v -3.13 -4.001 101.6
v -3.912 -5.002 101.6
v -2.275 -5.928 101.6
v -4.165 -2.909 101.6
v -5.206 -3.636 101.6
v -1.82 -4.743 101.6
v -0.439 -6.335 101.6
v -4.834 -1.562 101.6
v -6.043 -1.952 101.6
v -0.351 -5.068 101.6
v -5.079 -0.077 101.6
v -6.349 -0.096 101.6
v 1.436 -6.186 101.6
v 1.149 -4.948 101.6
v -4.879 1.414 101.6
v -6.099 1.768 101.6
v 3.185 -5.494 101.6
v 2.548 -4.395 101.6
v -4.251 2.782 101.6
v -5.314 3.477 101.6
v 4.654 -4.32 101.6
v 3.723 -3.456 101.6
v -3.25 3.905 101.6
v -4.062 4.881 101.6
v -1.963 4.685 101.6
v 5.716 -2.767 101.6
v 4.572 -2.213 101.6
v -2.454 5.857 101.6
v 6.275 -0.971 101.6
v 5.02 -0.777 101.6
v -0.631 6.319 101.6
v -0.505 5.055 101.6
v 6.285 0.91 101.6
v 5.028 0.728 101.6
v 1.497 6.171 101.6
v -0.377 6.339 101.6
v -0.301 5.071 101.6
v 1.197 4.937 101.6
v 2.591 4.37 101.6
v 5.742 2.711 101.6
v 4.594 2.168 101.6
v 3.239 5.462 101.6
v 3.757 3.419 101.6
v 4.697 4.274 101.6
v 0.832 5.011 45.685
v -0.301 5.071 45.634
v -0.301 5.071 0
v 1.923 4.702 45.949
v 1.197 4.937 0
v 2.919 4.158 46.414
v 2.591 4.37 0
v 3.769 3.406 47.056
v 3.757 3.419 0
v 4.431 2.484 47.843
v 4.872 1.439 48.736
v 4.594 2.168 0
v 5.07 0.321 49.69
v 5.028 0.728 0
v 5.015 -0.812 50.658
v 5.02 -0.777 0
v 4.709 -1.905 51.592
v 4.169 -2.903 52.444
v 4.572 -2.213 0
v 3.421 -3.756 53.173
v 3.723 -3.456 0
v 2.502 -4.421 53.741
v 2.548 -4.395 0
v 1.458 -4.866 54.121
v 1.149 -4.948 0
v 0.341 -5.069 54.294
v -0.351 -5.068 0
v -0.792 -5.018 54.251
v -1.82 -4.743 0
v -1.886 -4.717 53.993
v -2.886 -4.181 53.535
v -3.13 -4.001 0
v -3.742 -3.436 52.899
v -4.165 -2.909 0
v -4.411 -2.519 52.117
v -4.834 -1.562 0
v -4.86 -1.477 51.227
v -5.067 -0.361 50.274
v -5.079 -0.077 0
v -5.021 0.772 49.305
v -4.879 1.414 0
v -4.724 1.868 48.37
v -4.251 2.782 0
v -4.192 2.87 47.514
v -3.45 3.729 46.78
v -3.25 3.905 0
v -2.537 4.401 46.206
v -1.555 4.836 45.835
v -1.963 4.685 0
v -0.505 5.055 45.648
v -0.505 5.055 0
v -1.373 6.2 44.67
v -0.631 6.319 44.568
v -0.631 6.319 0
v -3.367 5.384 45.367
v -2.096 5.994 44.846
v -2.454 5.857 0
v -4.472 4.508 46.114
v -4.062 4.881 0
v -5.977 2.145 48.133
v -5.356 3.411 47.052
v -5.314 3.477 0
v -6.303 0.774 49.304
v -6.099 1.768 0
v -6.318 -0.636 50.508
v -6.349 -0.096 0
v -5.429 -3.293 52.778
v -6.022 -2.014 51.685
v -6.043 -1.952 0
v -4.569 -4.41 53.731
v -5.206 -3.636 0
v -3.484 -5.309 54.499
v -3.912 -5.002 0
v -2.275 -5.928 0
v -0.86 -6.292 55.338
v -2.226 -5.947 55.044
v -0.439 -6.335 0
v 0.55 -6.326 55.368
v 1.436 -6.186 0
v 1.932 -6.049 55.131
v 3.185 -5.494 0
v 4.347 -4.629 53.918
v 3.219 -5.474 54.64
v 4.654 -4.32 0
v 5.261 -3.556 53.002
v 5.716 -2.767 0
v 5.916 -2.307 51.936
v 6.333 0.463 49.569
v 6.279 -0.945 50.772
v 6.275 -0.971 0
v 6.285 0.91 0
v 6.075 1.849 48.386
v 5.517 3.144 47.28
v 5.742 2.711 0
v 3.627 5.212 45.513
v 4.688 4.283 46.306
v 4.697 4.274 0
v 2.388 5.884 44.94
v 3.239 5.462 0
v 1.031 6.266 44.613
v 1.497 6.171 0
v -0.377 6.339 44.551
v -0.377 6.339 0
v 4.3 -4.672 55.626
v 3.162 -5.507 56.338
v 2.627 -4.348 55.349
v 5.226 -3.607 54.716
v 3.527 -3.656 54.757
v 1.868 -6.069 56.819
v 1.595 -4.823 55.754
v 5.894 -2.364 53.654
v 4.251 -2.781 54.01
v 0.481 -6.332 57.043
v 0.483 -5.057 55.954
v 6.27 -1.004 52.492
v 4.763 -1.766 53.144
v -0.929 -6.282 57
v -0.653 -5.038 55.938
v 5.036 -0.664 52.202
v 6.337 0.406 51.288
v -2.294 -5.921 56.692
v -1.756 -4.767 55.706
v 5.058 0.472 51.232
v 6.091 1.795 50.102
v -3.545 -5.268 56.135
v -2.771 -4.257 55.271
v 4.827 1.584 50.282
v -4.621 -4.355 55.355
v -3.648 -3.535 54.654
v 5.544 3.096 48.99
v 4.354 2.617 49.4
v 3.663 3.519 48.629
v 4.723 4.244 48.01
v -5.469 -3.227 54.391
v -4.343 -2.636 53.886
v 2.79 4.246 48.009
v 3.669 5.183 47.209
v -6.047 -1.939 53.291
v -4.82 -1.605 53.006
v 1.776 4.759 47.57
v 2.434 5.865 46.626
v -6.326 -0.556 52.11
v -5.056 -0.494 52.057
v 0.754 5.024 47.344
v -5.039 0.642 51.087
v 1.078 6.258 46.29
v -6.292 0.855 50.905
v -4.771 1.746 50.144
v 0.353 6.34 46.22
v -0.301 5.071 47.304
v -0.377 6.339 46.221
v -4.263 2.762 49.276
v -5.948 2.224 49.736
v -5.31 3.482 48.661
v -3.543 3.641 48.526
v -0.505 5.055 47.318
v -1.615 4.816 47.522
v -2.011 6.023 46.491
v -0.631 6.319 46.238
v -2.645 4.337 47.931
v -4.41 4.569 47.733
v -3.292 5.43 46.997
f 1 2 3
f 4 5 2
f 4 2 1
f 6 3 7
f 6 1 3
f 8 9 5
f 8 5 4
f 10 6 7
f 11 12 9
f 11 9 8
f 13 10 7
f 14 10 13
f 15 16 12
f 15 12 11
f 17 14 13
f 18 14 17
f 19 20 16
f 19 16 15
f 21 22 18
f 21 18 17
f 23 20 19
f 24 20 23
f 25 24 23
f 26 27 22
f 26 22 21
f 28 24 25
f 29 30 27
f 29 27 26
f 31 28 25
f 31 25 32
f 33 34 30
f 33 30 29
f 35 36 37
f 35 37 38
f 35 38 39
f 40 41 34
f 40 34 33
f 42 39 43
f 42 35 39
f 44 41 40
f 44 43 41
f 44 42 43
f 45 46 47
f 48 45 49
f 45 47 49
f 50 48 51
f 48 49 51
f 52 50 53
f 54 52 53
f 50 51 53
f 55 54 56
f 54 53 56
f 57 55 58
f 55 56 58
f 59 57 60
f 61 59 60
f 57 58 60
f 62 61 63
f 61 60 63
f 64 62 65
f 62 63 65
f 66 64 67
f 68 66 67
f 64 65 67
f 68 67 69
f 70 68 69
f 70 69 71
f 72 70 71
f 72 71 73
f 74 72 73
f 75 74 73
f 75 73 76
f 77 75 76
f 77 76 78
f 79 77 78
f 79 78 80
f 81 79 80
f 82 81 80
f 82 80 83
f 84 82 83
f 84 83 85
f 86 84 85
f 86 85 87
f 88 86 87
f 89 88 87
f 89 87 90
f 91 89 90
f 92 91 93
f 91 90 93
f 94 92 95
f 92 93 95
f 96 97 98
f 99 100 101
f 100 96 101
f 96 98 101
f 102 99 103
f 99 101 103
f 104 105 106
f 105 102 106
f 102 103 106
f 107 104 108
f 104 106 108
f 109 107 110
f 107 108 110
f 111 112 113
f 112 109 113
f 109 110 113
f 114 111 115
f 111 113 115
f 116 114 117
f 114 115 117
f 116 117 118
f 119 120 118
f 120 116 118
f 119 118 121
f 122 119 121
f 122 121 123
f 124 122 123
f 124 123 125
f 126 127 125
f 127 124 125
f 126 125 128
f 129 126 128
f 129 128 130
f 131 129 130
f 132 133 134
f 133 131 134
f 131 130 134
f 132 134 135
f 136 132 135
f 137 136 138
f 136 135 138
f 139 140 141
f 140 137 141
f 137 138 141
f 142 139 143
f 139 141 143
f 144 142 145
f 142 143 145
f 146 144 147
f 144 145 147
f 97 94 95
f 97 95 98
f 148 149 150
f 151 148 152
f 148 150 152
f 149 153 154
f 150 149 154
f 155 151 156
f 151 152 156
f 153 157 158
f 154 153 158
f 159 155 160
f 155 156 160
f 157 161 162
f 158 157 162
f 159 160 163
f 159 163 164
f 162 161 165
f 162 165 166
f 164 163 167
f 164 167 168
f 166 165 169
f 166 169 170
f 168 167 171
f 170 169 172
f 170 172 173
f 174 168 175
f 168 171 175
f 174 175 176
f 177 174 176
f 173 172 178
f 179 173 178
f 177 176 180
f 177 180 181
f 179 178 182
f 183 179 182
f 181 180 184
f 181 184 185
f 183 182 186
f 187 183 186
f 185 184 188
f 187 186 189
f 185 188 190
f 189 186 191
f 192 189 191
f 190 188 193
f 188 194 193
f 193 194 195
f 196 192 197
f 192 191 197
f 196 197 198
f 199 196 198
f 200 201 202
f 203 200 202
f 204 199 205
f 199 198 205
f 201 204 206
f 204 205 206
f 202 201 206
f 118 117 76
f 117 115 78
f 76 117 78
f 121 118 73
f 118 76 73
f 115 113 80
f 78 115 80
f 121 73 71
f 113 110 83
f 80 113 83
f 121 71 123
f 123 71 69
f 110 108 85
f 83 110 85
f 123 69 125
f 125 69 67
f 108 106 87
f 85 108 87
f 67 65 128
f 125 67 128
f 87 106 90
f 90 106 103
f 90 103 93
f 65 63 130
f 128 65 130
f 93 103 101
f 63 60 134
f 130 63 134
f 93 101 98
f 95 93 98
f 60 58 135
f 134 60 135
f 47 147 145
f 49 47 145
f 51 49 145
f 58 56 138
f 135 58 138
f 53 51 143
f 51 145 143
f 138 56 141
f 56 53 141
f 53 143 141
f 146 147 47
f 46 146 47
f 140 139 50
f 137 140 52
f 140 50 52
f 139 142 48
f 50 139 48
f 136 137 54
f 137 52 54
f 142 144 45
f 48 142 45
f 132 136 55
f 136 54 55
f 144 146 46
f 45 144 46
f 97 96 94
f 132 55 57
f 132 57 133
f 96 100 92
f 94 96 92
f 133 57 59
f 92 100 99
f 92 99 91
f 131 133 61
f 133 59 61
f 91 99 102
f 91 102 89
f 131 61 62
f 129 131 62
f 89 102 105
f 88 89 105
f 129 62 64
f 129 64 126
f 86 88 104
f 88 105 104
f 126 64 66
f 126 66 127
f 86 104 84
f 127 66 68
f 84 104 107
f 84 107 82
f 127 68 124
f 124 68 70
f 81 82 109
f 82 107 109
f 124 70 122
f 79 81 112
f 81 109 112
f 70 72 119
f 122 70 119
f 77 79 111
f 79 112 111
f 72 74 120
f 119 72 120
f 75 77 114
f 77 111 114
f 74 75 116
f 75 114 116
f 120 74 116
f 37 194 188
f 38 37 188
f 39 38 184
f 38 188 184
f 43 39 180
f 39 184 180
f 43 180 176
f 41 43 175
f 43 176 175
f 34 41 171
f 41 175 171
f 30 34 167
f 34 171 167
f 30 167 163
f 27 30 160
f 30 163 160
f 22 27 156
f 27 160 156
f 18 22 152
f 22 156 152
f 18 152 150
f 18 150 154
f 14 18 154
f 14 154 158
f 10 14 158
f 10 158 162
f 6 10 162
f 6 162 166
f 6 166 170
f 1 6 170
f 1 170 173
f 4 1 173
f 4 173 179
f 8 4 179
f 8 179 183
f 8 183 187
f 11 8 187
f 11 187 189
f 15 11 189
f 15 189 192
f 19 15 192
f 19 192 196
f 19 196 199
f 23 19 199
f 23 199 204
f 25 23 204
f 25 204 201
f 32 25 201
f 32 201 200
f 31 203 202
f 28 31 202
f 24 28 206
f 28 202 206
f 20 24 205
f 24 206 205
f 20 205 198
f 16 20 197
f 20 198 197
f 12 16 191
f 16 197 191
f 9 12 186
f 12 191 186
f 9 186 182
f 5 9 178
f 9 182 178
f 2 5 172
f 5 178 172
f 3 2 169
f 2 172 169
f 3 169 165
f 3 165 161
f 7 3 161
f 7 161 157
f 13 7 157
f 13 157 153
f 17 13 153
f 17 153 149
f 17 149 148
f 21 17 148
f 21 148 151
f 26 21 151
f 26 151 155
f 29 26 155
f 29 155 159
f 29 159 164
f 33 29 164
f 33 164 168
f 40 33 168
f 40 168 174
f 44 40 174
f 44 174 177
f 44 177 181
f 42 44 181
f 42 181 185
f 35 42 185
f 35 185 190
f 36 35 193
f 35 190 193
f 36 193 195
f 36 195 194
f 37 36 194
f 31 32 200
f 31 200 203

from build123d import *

# Parameters (mm, degrees)
LOFTED_BENDS1_DEPTH     = 101.6
CUT_EXTRUDE1_DEPTH      = 102.996102867
CUT_EXTRUDE1_DEPTH_BACK = 102.996102867


# Read off the part's stored shape, not the designer's step: Lofted Bends1
with BuildPart() as part:
    # Lofted Bends1 outline → Lofted Bends1 (new body)
    with BuildSketch(Plane.XY):
        with BuildLine():
            Line((-0.376838499, 6.338808464), (-0.301470799, 5.071046771))
            ThreePointArc((-0.301470799, 5.071046771), (0.40315195, -5.063977538), (-0.504670799, 5.05486967))
            Line((-0.504670799, 5.05486967), (-0.630838499, 6.318587088))
            ThreePointArc((-0.630838499, 6.318587088), (0.503939925, -6.329971924), (-0.376838499, 6.338808464))
        make_face()
    extrude(amount=LOFTED_BENDS1_DEPTH)

    # Sketch11 → Cut-Extrude1 (cut, two sides: drawn at the far end of the back side and taken through both)
    with BuildSketch(Plane(origin=(0, 0, 0), x_dir=(0, 0, -1), z_dir=(1, 0, 0)).offset(-CUT_EXTRUDE1_DEPTH_BACK)):
        Polygon((-62.898670134, -13.187969334), (-39.667045442, 14.012768356), (-38.701329866, 13.187969334), (-61.932954558, -14.012768356), align=None)
    extrude(amount=CUT_EXTRUDE1_DEPTH + CUT_EXTRUDE1_DEPTH_BACK, mode=Mode.SUBTRACT)


with BuildPart() as cut_extrude1_piece_1:
    # of the separate pieces the step leaves, piece 1, a body of its own (cut_extrude1_pieces)
    add(part.part.solids().sort_by_distance((-0.504670799, 5.05486967, 0))[0])


with BuildPart() as cut_extrude1_piece_2:
    # of the separate pieces the step leaves, piece 2, a body of its own (cut_extrude1_pieces)
    add(part.part.solids().sort_by_distance((-0.504670799, 5.05486967, 47.317813692))[0])


solid = Compound([cut_extrude1_piece_1.part, cut_extrude1_piece_2.part])
